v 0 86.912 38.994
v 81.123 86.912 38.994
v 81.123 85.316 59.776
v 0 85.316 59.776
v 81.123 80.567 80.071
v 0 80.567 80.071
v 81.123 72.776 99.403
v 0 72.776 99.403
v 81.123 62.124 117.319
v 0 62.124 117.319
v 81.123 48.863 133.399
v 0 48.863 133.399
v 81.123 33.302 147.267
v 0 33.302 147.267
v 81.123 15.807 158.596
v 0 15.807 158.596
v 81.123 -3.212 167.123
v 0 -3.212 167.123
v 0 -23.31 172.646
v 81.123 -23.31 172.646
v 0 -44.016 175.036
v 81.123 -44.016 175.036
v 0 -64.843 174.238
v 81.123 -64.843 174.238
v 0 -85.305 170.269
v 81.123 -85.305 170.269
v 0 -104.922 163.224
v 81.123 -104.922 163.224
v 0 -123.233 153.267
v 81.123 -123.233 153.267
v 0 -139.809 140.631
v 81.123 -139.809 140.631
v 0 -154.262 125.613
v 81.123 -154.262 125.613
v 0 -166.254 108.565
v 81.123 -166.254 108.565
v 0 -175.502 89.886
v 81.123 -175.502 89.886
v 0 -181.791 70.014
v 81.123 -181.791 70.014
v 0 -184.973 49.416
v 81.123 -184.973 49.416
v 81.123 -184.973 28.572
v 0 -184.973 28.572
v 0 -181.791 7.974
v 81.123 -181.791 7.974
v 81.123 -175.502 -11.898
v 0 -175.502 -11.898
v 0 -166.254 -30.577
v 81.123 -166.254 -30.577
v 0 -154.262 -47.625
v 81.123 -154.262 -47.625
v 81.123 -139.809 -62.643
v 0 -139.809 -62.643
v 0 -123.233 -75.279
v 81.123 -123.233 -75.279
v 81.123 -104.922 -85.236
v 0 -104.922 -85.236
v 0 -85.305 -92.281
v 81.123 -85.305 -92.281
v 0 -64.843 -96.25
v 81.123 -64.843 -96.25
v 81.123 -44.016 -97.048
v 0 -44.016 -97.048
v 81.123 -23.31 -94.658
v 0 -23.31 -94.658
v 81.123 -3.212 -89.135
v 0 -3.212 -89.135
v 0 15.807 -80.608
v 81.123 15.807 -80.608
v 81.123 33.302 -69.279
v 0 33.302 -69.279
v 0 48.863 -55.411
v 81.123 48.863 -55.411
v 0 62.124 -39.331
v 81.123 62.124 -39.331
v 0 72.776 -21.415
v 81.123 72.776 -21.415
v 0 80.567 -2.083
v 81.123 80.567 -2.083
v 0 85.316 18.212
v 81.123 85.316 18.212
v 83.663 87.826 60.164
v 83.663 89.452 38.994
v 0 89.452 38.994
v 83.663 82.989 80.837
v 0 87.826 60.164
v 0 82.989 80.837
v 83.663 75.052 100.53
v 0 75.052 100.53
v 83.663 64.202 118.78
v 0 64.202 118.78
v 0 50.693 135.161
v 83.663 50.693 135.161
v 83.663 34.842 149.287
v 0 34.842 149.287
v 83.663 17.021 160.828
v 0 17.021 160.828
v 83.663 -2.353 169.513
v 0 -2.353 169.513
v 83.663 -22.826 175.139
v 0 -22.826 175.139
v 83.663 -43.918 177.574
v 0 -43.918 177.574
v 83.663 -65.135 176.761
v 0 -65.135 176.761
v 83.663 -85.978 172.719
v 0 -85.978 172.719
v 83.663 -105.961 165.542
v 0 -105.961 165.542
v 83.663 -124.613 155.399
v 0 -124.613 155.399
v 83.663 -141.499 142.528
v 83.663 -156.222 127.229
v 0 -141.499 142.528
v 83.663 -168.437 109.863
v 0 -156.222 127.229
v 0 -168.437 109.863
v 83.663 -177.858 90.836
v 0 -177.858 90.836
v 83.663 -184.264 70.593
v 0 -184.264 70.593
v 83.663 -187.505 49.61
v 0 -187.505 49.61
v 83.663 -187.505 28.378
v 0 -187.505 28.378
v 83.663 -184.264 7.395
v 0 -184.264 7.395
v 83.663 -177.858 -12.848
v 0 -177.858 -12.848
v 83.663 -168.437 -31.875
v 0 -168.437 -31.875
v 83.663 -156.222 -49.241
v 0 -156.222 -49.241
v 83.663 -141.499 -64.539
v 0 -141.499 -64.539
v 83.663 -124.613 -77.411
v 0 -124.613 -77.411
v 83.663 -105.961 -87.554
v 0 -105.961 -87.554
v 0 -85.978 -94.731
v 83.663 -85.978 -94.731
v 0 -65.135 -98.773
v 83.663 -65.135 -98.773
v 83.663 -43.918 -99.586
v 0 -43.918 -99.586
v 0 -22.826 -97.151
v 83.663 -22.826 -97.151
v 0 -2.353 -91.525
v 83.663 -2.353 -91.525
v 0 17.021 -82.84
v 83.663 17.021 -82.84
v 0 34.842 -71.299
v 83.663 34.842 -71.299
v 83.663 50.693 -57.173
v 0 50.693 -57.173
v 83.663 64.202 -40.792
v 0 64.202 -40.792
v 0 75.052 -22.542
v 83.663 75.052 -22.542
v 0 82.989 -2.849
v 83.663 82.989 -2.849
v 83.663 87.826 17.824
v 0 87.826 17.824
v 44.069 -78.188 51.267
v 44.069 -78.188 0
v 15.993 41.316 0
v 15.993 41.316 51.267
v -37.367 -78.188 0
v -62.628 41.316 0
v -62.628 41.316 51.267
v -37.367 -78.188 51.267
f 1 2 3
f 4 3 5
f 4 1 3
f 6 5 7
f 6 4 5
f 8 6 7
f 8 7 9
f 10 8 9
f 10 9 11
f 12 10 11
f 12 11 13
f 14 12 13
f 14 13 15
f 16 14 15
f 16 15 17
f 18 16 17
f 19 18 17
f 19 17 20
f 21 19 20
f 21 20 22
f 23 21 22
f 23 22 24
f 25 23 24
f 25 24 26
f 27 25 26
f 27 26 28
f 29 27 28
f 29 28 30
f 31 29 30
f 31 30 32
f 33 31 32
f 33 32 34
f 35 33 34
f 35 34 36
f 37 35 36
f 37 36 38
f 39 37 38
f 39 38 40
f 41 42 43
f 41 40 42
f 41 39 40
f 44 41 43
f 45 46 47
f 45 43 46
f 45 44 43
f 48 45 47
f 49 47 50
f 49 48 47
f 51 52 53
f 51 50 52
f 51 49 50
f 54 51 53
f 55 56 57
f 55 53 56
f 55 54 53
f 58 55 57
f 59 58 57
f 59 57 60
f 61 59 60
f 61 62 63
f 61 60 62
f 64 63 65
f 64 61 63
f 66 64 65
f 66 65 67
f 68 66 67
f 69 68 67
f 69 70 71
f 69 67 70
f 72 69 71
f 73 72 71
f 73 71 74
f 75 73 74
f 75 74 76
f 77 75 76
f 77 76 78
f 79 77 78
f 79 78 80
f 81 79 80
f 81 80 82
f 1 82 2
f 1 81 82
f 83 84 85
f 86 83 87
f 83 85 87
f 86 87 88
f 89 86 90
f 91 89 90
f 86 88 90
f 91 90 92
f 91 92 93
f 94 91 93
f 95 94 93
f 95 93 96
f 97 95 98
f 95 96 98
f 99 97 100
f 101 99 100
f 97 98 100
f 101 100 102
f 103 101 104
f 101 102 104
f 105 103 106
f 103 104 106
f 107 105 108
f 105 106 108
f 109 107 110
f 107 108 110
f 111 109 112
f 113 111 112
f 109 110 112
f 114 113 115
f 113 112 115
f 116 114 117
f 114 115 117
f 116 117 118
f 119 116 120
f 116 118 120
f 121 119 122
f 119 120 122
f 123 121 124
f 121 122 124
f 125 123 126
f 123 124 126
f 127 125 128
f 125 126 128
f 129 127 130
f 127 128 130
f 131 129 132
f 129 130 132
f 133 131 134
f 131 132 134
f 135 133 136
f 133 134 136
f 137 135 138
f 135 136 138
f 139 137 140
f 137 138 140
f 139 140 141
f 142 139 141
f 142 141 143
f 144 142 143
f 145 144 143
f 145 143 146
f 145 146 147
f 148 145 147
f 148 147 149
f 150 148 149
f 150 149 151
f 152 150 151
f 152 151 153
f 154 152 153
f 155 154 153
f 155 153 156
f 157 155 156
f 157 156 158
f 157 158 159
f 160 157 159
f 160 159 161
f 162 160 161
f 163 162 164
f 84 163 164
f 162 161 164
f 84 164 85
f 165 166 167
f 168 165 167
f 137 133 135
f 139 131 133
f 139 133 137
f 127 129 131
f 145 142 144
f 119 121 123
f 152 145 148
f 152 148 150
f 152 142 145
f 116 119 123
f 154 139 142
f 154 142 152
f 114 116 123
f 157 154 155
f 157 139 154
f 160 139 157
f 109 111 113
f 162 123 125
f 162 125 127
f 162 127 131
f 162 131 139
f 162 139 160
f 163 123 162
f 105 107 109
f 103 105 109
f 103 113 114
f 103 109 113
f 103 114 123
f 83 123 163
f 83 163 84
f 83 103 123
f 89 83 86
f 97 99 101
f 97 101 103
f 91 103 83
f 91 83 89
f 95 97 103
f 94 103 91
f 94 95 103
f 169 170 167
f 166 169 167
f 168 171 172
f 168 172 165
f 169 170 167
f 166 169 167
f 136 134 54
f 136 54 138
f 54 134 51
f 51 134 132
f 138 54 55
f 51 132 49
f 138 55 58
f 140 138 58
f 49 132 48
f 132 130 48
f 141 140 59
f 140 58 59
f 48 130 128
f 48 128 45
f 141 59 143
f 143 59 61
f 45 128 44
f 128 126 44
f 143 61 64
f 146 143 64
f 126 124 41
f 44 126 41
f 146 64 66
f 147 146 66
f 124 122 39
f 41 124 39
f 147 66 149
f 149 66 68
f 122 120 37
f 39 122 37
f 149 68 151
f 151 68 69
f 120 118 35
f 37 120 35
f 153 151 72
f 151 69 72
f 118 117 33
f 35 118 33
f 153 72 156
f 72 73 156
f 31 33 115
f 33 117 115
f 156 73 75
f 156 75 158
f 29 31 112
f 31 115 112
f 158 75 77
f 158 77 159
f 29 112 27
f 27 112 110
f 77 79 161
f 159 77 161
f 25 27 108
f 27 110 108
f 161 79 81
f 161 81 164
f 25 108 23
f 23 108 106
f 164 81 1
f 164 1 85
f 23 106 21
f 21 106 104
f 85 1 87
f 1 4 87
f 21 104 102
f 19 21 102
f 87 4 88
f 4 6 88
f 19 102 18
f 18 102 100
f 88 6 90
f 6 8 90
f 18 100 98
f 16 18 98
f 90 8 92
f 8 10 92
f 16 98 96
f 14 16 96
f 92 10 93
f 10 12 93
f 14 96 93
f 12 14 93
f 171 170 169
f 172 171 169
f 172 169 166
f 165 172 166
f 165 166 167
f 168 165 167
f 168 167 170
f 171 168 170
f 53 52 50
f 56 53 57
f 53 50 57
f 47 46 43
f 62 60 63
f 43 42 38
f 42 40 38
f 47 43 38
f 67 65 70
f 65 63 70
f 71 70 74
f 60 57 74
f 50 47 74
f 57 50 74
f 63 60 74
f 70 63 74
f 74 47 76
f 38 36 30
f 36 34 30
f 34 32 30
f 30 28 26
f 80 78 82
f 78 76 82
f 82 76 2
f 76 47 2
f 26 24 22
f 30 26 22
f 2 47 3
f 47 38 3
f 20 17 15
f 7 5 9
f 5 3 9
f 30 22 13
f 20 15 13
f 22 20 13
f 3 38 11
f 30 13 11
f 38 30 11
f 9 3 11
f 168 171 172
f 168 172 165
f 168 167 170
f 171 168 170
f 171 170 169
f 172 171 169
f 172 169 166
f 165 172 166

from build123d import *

# Parameters (mm, degrees)
F2_DEPTH = 51.2674227357
F3_R     = 138.682012458
F4_DEPTH = 83.662904799
F5_T     = -2.54


with BuildPart() as f2:
    # F1 (on face) → F2 (new body)
    with BuildSketch(Plane.XY):
        Polygon((44.0687835217, -78.1884640455), (15.9933380783, 41.3164198399), (-62.6282095909, 41.3164198399), (-37.3669266701, -78.1884640455), align=None)
    extrude(amount=F2_DEPTH)


with BuildPart() as f2b:
    # F0 (on Top) → F2, piece 2 (new body)
    with BuildSketch(Plane.XY):
        Polygon((15.9933380783, 41.3164198399), (-62.6282095909, 41.3164198399), (-37.3669266701, -78.1884640455), (44.0687835217, -78.1884640455), align=None)
    extrude(amount=F2_DEPTH)


with BuildPart() as f4:
    # F3 (on Right) → F4 (new body)
    with BuildSketch(Plane.YZ):
        with Locations((-49.230247736, 38.9940589666)):
            Circle(F3_R)
    extrude(amount=F4_DEPTH)

    # F5
    f5_openings = [f4.faces().sort_by_distance(p)[0] for p in [
        (0, -49.230248, 38.994059),
    ]]
    offset(amount=F5_T, openings=f5_openings)


solid = Compound([f2.part, f2b.part, f4.part])
